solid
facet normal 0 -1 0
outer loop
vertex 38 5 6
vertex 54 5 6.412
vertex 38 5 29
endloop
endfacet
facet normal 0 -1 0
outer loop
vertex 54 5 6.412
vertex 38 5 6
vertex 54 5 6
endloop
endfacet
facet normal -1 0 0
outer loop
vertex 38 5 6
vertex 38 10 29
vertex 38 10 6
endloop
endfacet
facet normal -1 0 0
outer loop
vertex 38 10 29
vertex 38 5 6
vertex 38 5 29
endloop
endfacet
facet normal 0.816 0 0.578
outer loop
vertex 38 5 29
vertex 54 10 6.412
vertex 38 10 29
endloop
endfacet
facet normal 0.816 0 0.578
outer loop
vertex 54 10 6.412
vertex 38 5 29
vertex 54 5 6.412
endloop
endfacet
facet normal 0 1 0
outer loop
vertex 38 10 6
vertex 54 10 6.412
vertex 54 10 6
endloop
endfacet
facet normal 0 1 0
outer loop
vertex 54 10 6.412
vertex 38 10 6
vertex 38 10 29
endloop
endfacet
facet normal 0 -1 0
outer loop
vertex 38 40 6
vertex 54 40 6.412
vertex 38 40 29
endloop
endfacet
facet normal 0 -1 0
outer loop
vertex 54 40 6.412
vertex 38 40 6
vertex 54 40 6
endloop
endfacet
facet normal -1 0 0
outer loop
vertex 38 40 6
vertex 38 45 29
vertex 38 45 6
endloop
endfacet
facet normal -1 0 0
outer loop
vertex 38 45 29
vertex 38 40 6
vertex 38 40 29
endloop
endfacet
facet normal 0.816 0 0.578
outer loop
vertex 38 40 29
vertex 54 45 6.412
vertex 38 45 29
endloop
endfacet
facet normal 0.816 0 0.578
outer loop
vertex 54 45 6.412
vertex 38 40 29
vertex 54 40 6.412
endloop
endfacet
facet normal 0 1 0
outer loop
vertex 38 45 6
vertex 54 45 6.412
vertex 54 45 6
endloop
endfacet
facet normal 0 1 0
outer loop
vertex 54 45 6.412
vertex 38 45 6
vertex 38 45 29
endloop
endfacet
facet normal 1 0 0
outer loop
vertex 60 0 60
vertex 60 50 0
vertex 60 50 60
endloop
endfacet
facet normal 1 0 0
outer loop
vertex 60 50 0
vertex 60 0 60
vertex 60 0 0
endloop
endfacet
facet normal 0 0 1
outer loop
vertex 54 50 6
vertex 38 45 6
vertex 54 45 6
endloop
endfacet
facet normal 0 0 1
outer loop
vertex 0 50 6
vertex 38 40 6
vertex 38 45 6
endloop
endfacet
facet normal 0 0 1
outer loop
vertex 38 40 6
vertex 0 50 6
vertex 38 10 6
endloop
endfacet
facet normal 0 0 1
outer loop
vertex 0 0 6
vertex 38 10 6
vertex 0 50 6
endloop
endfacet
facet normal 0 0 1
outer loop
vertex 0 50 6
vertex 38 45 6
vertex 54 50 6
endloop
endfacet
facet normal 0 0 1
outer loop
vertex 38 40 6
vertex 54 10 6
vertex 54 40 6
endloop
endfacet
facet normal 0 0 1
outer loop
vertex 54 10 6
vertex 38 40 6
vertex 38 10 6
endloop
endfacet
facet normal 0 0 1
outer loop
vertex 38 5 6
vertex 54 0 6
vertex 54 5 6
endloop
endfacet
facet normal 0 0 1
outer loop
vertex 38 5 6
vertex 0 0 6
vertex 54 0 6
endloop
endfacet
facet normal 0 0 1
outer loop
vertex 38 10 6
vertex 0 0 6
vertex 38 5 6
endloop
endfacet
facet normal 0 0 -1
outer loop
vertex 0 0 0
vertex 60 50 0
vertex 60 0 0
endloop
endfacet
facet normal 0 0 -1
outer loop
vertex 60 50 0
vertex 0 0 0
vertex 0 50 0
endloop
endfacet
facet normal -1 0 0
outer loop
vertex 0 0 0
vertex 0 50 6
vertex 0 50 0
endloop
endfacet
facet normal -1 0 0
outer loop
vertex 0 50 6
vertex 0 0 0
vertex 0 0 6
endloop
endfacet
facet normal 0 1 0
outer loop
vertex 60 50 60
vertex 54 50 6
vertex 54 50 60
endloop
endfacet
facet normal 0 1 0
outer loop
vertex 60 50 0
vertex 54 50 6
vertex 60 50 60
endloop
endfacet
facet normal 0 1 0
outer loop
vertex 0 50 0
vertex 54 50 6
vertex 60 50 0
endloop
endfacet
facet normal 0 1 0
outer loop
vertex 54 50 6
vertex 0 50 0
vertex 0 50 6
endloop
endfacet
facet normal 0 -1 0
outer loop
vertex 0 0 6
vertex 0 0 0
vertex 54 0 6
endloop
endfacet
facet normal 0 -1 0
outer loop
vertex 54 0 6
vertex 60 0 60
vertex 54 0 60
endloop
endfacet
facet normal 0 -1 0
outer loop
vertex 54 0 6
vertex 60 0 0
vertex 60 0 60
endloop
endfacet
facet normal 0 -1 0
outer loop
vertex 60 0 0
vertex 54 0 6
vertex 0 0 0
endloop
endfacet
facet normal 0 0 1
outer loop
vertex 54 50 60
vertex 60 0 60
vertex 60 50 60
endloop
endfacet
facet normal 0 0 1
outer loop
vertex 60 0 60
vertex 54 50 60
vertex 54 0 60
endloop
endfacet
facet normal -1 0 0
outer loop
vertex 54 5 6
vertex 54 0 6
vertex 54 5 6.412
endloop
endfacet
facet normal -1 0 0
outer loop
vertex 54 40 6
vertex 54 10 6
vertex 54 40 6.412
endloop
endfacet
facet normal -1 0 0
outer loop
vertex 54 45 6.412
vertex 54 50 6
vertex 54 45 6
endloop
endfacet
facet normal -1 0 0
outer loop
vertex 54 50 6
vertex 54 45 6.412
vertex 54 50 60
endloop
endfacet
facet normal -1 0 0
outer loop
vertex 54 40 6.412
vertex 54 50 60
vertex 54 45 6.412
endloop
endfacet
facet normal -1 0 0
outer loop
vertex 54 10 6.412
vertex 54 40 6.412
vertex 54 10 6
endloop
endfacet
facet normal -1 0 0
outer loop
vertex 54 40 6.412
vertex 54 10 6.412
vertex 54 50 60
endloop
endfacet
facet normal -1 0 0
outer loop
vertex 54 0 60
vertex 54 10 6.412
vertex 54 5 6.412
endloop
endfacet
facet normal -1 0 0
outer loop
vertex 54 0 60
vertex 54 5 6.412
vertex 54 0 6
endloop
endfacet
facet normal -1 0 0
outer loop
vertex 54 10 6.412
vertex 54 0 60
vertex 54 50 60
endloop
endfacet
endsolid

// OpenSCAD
$fn = 32;

// ----------------------------------------------------------------------
// Rib bracket: 2-gusset L bracket
// ----------------------------------------------------------------------

// --- parameters (mm) ---
base_l = 60;              // foot length, X
base_w = 50;              // foot width, Y
base_t = 6;               // foot thickness
plate_t = 6;              // upright plate thickness
plate_h = 60;             // overall height
gus_l = 16;               // gusset leg along the foot
gus_h = 24;               // gusset height
gus_t = 5;                // gusset thickness
gus_edge = 5;             // gusset margin from the foot edge
n_gus = 2;                // gusset count

gus_pitch = (base_w - 2 * gus_edge - gus_t) / (n_gus - 1);  // gusset pitch

union() {
  cube([base_l, base_w, base_t]);
  translate([base_l - plate_t, 0, base_t - 1])
    cube([plate_t, base_w, plate_h - base_t + 1]);
  for (i = [0 : n_gus - 1])
    translate([base_l - plate_t - gus_l, gus_edge + i * gus_pitch, base_t - 1])
      rotate([-90, 0, 0])
        linear_extrude(height = gus_t)
          polygon(points = [[0, 0], [gus_l + 1, 0], [0, -gus_h]]);
}
